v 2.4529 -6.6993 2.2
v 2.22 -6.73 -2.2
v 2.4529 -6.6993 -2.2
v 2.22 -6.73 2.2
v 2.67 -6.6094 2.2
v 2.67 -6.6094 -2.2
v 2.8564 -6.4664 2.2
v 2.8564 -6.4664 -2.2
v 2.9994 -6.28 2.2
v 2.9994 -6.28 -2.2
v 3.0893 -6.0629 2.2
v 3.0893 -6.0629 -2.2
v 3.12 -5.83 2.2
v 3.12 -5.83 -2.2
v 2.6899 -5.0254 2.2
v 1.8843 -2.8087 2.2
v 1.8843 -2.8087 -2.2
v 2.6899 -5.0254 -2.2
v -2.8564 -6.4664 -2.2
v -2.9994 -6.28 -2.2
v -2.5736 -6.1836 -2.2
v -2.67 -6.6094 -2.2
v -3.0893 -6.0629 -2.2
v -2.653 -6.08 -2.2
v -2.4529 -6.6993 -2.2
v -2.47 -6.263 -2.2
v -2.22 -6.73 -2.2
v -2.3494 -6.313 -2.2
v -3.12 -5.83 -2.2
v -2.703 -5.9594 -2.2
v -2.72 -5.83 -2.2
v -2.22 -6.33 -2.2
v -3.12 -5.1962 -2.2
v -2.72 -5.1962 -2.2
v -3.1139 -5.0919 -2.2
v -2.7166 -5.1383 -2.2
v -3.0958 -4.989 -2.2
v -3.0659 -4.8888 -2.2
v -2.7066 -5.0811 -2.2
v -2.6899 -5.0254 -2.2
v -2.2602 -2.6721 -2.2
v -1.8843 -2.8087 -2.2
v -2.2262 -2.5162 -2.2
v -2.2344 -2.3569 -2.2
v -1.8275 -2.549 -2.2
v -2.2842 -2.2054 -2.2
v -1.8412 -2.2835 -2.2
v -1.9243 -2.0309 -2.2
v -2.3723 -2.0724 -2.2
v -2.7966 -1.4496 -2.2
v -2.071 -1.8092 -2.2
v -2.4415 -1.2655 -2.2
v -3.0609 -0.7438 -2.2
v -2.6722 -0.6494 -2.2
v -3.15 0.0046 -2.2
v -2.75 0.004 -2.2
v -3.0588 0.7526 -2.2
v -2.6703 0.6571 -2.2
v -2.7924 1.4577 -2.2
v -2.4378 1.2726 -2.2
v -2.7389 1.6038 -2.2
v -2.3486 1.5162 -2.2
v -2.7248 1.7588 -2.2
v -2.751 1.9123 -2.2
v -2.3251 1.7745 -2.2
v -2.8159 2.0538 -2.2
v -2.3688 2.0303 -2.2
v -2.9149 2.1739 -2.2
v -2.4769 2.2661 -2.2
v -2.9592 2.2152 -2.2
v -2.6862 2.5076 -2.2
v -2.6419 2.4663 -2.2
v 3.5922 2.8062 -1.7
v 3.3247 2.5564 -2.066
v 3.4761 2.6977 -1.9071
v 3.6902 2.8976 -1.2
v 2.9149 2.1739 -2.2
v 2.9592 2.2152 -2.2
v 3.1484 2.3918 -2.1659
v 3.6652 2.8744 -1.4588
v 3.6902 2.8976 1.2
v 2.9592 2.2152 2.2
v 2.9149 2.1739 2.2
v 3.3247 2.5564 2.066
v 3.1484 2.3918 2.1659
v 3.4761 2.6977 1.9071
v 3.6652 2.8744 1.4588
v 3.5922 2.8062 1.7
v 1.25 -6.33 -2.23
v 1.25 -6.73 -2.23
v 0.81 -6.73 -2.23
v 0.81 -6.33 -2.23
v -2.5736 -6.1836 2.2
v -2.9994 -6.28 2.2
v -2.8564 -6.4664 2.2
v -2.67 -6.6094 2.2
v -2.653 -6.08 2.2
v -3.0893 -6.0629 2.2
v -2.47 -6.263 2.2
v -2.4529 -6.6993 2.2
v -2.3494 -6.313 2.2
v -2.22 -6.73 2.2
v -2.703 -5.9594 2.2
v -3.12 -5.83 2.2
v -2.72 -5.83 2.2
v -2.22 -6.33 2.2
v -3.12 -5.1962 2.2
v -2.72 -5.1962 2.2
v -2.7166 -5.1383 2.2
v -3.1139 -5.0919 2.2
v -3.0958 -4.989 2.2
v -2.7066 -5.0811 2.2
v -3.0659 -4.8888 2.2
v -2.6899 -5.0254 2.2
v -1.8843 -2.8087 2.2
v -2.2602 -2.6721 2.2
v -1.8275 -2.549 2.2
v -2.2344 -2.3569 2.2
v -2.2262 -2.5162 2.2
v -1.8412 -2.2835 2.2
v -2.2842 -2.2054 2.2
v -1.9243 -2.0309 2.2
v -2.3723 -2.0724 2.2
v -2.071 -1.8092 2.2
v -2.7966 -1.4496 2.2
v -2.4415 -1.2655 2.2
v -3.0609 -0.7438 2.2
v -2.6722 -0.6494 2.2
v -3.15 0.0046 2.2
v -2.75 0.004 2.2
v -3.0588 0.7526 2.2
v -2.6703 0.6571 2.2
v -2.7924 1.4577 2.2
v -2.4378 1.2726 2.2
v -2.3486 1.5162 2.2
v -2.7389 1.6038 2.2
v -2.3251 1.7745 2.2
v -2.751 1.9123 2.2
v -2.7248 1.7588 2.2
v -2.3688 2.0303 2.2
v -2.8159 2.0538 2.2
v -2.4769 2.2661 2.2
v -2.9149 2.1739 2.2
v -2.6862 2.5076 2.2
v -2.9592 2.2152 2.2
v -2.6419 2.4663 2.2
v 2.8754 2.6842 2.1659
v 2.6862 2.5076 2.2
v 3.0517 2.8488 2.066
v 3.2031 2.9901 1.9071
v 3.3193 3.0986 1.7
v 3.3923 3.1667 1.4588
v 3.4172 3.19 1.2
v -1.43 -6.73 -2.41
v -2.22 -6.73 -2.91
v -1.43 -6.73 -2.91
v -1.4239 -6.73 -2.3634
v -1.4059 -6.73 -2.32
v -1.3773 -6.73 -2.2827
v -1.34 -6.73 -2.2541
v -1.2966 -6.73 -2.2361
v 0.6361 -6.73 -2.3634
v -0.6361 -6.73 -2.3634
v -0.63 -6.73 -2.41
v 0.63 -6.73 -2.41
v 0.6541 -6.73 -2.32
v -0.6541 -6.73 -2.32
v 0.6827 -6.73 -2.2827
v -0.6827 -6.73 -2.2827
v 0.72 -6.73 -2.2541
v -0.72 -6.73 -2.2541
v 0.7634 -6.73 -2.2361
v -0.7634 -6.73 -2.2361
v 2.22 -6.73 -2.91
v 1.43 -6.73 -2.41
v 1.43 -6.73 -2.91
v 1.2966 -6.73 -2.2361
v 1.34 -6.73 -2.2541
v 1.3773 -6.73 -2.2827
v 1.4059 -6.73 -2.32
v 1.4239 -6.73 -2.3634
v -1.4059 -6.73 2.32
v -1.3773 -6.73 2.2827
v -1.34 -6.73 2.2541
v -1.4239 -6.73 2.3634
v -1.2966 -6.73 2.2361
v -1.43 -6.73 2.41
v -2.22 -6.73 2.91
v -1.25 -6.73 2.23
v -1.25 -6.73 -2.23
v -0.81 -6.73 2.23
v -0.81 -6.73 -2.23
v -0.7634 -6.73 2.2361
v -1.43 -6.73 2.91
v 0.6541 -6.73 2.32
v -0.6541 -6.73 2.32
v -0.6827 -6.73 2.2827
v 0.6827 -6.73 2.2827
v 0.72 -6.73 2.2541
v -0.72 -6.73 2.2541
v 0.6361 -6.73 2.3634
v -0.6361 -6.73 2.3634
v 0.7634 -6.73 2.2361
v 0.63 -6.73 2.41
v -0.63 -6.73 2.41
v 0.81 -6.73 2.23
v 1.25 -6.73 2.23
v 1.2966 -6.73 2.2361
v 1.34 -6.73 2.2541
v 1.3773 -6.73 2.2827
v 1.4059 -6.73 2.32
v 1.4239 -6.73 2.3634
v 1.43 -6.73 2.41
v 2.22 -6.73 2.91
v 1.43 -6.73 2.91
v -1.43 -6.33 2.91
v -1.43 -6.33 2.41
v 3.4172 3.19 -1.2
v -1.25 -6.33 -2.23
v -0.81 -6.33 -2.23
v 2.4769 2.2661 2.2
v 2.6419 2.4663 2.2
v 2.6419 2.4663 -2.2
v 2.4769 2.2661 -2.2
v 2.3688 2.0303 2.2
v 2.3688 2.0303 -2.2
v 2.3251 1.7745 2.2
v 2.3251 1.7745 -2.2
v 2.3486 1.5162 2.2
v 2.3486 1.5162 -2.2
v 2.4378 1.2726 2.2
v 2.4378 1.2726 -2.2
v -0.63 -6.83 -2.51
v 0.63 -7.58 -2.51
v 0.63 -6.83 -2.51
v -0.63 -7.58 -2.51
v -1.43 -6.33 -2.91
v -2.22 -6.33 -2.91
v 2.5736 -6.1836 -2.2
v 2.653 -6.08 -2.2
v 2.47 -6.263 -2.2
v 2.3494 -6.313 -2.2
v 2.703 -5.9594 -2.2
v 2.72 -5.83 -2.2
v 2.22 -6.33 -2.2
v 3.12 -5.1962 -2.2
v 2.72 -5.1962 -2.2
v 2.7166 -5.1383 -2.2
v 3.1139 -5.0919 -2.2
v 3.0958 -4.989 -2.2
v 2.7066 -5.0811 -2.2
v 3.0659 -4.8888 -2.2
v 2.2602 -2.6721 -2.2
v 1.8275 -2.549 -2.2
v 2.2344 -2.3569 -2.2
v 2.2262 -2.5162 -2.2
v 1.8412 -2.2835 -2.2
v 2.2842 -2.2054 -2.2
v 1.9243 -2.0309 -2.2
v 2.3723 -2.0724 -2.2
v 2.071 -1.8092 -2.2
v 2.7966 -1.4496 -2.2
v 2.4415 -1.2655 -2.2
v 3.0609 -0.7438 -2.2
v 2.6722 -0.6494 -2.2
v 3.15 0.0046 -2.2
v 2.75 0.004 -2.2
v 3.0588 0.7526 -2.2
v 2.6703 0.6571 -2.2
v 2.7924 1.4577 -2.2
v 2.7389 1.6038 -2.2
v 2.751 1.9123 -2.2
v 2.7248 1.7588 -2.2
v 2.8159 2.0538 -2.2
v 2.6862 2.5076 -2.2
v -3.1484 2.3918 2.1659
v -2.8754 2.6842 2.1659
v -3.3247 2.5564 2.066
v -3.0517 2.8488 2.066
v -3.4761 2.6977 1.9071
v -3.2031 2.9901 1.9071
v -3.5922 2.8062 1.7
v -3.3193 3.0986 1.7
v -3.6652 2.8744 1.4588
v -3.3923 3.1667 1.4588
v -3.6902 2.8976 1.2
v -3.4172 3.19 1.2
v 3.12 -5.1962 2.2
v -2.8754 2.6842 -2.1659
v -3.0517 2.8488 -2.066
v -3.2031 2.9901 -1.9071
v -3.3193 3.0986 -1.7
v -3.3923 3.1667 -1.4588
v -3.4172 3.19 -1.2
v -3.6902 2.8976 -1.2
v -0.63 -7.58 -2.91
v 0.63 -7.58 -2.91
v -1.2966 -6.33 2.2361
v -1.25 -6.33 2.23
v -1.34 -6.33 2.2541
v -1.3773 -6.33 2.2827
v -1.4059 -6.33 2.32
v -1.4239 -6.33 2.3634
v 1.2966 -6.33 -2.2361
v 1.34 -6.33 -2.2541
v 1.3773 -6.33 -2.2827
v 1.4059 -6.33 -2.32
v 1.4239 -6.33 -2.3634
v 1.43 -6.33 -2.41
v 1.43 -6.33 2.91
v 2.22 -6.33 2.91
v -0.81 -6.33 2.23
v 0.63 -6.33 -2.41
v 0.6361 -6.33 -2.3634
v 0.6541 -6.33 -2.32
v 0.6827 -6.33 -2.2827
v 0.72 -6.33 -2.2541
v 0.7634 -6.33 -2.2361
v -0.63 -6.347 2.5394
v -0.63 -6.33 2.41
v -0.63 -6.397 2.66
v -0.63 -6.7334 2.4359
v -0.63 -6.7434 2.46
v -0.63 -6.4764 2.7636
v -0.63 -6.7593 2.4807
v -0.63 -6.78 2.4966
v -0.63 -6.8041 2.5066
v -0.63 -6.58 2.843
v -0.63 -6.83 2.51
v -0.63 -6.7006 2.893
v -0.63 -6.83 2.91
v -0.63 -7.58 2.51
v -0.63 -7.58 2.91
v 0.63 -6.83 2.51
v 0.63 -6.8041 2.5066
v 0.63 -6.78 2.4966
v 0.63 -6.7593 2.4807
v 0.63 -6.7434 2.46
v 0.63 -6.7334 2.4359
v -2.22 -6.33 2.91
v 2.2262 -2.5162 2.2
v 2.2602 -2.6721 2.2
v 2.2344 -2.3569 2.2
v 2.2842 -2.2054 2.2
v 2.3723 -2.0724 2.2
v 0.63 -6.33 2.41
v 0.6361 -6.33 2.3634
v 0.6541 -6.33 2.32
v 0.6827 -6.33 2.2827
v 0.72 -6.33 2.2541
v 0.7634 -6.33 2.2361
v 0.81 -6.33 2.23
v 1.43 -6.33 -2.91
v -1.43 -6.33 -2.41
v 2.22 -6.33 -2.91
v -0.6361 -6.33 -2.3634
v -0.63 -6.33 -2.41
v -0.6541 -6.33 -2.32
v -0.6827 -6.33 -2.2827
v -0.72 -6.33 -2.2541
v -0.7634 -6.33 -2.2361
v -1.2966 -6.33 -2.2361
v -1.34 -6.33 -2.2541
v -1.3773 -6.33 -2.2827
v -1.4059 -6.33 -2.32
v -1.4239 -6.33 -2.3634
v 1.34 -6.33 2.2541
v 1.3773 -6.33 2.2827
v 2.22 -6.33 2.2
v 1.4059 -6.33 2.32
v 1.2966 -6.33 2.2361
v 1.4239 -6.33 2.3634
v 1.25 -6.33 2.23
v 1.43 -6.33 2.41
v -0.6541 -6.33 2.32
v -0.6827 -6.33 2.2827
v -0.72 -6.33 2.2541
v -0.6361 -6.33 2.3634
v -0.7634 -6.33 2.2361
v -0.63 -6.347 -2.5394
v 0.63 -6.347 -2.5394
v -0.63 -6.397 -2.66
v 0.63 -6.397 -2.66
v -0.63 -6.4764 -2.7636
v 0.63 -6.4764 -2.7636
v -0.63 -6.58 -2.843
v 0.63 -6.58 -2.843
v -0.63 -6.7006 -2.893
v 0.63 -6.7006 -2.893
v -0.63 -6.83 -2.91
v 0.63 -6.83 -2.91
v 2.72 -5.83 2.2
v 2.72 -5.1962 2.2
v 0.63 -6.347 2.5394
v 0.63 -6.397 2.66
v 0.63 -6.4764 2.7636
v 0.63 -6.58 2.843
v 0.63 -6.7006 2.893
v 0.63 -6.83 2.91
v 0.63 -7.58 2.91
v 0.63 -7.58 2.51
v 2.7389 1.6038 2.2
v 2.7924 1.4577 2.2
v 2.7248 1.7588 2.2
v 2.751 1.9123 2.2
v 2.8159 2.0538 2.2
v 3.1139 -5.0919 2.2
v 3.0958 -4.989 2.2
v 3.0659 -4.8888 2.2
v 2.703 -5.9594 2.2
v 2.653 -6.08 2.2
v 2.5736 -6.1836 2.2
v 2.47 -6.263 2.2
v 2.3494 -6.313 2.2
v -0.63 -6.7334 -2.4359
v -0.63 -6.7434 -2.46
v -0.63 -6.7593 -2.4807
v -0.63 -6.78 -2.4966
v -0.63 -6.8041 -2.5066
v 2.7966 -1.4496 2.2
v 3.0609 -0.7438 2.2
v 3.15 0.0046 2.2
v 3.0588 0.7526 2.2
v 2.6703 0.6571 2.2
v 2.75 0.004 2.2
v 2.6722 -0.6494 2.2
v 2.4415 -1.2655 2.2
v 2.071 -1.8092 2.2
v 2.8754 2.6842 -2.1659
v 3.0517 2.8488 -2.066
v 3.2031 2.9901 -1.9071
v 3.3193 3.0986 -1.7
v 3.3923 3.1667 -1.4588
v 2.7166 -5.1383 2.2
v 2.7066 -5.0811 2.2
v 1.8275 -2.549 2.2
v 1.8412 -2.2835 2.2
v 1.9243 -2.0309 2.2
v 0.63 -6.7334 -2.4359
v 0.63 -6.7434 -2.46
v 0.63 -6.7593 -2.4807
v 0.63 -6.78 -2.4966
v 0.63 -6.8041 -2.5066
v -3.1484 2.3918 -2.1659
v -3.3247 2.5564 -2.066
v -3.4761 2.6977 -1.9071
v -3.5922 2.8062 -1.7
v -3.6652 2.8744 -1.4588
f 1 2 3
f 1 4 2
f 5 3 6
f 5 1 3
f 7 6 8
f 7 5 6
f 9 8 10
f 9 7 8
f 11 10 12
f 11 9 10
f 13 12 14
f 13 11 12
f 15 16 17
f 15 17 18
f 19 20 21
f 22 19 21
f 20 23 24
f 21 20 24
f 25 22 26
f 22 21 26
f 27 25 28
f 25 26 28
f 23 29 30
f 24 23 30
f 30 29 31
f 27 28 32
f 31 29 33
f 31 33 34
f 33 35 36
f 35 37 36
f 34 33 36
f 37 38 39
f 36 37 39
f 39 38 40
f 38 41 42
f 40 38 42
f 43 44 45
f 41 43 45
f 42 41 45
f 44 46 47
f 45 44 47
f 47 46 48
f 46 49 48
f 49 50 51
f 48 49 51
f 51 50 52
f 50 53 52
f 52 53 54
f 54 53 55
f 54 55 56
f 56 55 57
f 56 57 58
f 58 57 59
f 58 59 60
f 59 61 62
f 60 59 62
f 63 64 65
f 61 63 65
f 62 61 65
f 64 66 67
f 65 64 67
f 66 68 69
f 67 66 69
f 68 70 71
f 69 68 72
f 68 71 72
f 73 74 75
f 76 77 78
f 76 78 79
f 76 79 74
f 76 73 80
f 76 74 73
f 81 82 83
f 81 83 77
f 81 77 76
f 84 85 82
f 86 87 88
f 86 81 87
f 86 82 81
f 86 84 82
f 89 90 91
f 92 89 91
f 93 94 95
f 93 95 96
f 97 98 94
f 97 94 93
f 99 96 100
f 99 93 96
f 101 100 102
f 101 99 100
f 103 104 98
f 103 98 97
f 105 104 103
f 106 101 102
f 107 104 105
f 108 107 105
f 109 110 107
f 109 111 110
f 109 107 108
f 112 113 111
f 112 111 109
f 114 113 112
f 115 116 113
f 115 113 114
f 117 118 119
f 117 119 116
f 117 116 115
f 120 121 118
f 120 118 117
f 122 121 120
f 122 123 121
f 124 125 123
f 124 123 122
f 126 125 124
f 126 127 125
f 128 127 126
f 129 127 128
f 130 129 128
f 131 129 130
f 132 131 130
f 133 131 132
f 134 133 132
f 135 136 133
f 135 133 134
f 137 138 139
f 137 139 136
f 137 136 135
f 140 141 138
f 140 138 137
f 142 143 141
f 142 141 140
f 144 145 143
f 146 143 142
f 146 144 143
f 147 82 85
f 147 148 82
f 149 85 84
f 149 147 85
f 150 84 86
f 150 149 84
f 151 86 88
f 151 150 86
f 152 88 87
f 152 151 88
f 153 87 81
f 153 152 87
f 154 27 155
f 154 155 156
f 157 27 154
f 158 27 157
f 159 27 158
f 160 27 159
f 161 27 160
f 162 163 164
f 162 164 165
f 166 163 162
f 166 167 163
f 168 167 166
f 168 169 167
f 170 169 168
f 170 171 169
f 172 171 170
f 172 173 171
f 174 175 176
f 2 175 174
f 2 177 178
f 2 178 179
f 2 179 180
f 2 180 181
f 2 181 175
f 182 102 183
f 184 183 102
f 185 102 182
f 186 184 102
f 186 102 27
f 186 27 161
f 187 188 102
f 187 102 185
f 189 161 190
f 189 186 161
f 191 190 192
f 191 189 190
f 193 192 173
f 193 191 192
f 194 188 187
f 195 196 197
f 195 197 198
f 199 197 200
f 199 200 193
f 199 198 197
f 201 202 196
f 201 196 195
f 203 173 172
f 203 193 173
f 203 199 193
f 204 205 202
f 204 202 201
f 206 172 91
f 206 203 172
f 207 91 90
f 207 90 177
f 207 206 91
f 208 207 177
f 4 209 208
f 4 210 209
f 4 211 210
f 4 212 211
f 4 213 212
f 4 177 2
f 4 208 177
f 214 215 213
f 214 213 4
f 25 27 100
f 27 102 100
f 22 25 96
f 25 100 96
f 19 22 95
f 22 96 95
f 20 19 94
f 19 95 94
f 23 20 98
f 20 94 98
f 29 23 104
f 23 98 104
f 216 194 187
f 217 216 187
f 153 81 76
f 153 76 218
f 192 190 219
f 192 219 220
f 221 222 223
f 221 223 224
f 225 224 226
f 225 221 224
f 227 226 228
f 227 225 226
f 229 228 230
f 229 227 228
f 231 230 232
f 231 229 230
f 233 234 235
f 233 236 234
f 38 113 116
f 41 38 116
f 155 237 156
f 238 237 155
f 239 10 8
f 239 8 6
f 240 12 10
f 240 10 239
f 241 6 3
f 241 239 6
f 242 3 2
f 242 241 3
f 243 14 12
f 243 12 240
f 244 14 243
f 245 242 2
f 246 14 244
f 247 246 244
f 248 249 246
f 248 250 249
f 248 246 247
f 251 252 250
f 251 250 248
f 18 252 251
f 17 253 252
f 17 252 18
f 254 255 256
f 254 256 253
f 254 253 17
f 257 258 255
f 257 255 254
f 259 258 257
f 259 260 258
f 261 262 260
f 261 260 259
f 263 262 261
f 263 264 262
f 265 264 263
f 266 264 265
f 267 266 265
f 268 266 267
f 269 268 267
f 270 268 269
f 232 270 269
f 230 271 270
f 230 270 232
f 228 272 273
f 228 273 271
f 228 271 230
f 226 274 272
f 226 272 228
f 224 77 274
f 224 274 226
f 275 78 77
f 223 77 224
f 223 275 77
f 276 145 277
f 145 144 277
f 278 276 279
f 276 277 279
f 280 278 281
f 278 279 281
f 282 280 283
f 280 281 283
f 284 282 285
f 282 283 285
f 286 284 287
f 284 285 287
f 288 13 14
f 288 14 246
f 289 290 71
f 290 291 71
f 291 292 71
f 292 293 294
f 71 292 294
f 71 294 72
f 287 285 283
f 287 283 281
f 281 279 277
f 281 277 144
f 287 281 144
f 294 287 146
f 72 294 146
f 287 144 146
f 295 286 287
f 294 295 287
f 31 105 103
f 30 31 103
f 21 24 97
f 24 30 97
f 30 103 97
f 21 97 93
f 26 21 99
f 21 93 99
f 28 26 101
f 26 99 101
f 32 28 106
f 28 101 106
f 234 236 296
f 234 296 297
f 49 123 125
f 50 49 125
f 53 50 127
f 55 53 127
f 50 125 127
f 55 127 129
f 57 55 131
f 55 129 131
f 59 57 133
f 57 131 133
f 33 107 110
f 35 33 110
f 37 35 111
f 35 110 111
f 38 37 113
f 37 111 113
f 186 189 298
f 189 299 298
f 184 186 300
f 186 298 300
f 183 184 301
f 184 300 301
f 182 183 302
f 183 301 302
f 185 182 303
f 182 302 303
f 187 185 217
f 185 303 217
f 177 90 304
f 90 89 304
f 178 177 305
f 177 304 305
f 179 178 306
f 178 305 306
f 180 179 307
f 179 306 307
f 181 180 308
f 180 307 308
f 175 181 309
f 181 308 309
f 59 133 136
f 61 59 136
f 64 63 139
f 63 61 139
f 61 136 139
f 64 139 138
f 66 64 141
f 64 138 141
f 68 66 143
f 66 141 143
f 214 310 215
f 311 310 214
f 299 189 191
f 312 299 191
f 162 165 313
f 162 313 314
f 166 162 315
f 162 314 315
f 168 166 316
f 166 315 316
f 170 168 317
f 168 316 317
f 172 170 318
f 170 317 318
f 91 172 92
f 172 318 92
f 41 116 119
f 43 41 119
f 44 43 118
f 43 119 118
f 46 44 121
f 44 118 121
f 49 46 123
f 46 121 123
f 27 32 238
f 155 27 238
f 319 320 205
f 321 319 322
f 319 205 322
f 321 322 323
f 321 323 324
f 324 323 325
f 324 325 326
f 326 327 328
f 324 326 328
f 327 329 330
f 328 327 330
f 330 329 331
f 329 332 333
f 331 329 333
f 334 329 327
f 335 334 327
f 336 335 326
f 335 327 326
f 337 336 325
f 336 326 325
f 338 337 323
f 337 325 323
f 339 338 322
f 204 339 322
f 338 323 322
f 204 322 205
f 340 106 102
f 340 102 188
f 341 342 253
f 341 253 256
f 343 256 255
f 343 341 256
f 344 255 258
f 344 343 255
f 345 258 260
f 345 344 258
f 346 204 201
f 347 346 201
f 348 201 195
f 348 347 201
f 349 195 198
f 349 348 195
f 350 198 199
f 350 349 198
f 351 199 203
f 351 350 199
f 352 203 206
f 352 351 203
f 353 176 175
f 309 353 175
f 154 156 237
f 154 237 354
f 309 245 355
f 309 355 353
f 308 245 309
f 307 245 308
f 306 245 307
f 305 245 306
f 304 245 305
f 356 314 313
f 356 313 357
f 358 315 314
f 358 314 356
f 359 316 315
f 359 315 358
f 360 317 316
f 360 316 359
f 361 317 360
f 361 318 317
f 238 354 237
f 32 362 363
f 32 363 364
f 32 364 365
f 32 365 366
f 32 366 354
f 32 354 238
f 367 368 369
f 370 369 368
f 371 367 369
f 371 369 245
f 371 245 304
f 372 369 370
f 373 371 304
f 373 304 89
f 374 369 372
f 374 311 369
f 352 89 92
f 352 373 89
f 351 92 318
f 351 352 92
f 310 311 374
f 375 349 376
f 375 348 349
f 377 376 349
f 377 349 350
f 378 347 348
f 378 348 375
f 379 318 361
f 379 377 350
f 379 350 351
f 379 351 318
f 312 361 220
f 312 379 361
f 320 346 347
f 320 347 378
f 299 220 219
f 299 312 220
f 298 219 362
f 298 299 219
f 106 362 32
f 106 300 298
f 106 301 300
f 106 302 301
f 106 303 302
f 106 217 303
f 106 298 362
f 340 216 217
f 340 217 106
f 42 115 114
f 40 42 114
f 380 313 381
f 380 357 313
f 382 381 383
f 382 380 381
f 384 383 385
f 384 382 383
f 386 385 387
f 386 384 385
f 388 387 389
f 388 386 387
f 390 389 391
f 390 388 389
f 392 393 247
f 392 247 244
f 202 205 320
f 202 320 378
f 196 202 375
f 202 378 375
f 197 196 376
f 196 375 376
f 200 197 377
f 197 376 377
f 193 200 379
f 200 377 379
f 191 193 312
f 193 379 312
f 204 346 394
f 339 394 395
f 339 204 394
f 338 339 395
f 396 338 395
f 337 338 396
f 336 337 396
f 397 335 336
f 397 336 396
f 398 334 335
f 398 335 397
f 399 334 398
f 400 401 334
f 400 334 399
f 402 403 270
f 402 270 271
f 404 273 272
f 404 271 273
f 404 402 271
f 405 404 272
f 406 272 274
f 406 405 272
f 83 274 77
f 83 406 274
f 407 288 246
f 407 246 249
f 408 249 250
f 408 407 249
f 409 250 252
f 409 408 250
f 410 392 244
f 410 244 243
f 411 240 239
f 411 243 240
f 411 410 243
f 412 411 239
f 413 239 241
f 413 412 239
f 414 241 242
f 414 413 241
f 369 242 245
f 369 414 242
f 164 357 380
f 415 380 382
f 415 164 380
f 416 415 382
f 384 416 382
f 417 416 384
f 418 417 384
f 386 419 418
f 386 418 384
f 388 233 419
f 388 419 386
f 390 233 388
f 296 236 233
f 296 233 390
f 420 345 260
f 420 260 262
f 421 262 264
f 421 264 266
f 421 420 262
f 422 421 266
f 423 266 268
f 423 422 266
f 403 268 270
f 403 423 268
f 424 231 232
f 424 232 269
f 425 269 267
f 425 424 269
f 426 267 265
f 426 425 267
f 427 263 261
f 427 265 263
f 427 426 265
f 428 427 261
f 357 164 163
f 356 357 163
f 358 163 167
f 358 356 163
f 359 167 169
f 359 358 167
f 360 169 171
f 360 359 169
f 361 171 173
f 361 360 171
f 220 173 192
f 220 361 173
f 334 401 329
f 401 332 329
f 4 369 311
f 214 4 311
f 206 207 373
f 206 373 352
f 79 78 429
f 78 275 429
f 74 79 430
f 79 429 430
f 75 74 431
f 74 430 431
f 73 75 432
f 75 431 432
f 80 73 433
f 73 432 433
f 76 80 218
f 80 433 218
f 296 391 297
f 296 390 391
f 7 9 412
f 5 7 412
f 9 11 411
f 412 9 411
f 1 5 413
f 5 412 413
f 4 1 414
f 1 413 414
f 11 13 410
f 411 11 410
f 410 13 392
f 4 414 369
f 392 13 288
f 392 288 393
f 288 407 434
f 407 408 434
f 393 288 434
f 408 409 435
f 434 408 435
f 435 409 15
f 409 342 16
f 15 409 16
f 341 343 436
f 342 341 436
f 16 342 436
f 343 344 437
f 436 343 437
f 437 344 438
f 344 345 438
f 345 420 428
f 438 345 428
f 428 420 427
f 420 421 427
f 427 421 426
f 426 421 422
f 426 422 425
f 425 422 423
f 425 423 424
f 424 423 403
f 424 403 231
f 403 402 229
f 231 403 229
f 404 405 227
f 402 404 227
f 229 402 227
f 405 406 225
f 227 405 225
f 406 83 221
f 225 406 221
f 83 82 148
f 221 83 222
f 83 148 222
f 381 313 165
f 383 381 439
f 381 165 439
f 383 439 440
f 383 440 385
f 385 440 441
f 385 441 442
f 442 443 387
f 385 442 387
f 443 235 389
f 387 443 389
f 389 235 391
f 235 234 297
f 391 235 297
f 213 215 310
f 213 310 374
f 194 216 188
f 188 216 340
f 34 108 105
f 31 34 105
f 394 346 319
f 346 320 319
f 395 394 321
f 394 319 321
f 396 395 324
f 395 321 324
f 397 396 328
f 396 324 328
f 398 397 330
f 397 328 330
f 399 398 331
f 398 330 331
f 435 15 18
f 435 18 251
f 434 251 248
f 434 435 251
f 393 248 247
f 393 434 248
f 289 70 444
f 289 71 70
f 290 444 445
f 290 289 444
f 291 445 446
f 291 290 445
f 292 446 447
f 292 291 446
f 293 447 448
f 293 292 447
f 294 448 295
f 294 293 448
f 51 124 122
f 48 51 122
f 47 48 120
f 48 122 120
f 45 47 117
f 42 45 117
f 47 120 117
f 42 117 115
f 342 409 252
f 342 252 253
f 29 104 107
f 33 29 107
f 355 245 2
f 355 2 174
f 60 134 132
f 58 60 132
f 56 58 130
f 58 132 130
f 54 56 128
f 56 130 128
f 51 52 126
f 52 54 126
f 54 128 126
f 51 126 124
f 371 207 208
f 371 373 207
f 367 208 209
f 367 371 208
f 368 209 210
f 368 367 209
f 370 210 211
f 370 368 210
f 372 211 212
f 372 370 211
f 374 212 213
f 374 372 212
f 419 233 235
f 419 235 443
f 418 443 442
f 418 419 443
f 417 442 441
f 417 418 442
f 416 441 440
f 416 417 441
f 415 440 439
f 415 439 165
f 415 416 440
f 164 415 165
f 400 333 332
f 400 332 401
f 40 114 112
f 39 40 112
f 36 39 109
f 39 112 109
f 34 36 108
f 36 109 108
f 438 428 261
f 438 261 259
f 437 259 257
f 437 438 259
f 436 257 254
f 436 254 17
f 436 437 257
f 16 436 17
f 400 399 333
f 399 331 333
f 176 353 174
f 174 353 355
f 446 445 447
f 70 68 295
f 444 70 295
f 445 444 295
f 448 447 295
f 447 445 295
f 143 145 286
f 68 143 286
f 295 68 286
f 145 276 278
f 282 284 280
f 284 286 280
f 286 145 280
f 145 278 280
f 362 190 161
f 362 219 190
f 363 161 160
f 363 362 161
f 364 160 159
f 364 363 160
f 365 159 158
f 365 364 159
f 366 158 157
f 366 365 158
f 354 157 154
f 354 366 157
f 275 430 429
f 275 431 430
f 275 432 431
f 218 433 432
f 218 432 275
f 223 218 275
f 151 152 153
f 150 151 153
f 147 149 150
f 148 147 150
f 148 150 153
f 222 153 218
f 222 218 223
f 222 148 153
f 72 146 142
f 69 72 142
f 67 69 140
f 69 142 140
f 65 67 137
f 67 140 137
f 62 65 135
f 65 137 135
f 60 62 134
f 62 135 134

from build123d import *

# Parameters (mm, degrees)
SM_BASE_FLANGE_1_DEPTH            = 2.91
CUT_EXTRUDE_START                 = -9.92
CUT_EXTRUDE_2_OUTLINE_W           = 5
CUT_EXTRUDE_2_OUTLINE_H           = 0.71
CUT_EXTRUDE_2_DEPTH               = 9.52
CUT_EXTRUDE_START_2               = -0.4
CUT_EXTRUDE_2_2_OUTLINE_W         = 0.9
CUT_EXTRUDE_2_2_OUTLINE_H         = 0.71
CUT_EXTRUDE_2_2_DEPTH             = 0.4
SM_EDGE_FLANGE_2_STRIP_W          = 1.8
SM_EDGE_FLANGE_2_STRIP_H          = 0.4
SM_EDGE_FLANGE_2_STRIP_CUT_DEPTH  = 0.63
SM_EDGE_FLANGE_2_RELIEF_W         = 1.98
SM_EDGE_FLANGE_2_RELIEF_H         = 0.8
SM_EDGE_FLANGE_2_RELIEF_CUT_DEPTH = 0.4
SM_EDGE_FLANGE_2_DEPTH            = 0.63
FILLET_3_R                        = 0.18
CUT_EXTRUDE_4_DEPTH               = 12.348755283
FILLET_4_R                        = 1
SKETCH_33_W                       = 2.00295296
SKETCH_33_H                       = 3.384867517
CUT_EXTRUDE_5_DEPTH               = 13.417670735


# Read off the part's stored shape, not the designer's step: 切除-拉伸2
# Sheet-metal steps are written as plain solids
with BuildPart() as part:
    # Sketch 1 → 基体-法兰1 (new body)
    with BuildSketch(Plane.XY):
        with BuildLine():
            Line((-3.4172, 3.19), (-2.64194931, 2.466293544))
            ThreePointArc((-2.64194931, 2.466293544), (-2.338641394, 1.90383514), (-2.437847629, 1.272556064))
            ThreePointArc((-2.437847629, 1.272556064), (-2.730725187, -0.325023008), (-2.071040526, -1.809223905))
            ThreePointArc((-2.071040526, -1.809223905), (-1.841158131, -2.283453933), (-1.884290869, -2.808696355))
            Line((-1.884290869, -2.808696355), (-2.689927651, -5.025447504))
            ThreePointArc((-2.689927651, -5.025447504), (-2.712424525, -5.109527023), (-2.72, -5.196233927))
            Line((-2.72, -5.196233927), (-2.72, -5.83))
            ThreePointArc((-2.72, -5.83), (-2.573553391, -6.183553391), (-2.22, -6.33))
            Line((-2.22, -6.33), (0, -6.33))
            Line((0, -6.33), (0, -6.73))
            Line((0, -6.73), (-2.22, -6.73))
            ThreePointArc((-2.22, -6.73), (-2.856396103, -6.466396103), (-3.12, -5.83))
            Line((-3.12, -5.83), (-3.12, -5.196233927))
            ThreePointArc((-3.12, -5.196233927), (-3.106364145, -5.0401615), (-3.065869772, -4.888818365))
            Line((-3.065869772, -4.888818365), (-2.26023299, -2.672067216))
            ThreePointArc((-2.26023299, -2.672067216), (-2.234353348, -2.356921763), (-2.372282784, -2.072383746))
            ThreePointArc((-2.372282784, -2.072383746), (-3.127921577, -0.372299082), (-2.792443648, 1.457655128))
            ThreePointArc((-2.792443648, 1.457655128), (-2.732919907, 1.836422573), (-2.914904656, 2.173897616))
            Line((-2.914904656, 2.173897616), (-3.690155347, 2.897604072))
            Line((-3.690155347, 2.897604072), (-3.4172, 3.19))
        make_face()
    extrude(amount=SM_BASE_FLANGE_1_DEPTH)

    # 切除-拉伸2 outline → 切除-拉伸2 (cut)
    with BuildSketch(Plane.XZ.offset(6.73).offset(CUT_EXTRUDE_START)):
        with Locations((-2.5, 2.555)):
            Rectangle(CUT_EXTRUDE_2_OUTLINE_W, CUT_EXTRUDE_2_OUTLINE_H)
    extrude(amount=CUT_EXTRUDE_2_DEPTH, mode=Mode.SUBTRACT)

    # Cut-Extrude 2 2 outline → Cut-Extrude 2 2 (cut)
    with BuildSketch(Plane.XZ.offset(6.73).offset(CUT_EXTRUDE_START_2)):
        with Locations((-2.67, 2.555)):
            Rectangle(CUT_EXTRUDE_2_2_OUTLINE_W, CUT_EXTRUDE_2_2_OUTLINE_H)
    extrude(amount=CUT_EXTRUDE_2_2_DEPTH, mode=Mode.SUBTRACT)

    # 边线-法兰2 strip (across the edge) → 边线-法兰2 strip cut (cut)
    with BuildSketch(Plane(origin=(0, -6.73, 2.91), x_dir=(0, 0, -1), z_dir=(-1, 0, 0))):
        with Locations((-0.4, -0.2)):
            Rectangle(SM_EDGE_FLANGE_2_STRIP_W, SM_EDGE_FLANGE_2_STRIP_H)
    extrude(amount=SM_EDGE_FLANGE_2_STRIP_CUT_DEPTH, mode=Mode.SUBTRACT)

    # 边线-法兰2 relief (on the sheet) → 边线-法兰2 relief cut (cut)
    with BuildSketch(Plane(origin=(0, -6.73, 2.41), x_dir=(0, 0, -1), z_dir=(0, -1, 0))):
        with Locations((-0.81, -1.03)):
            Rectangle(SM_EDGE_FLANGE_2_RELIEF_W, SM_EDGE_FLANGE_2_RELIEF_H)
    extrude(amount=-SM_EDGE_FLANGE_2_RELIEF_CUT_DEPTH, mode=Mode.SUBTRACT)

    # 边线-法兰2 section (across the edge) → 边线-法兰2 (add)
    with BuildSketch(Plane(origin=(0, -6.73, 2.91), x_dir=(0, 0, -1), z_dir=(-1, 0, 0))):
        with BuildLine():
            Line((0, 0.1), (0, 3.6))
            Line((0, 3.6), (0.4, 3.6))
            Line((0.4, 3.6), (0.4, 0.1))
            ThreePointArc((0.4, 0.1), (0.429289322, 0.029289322), (0.5, 0))
            Line((0.5, 0), (0.5, -0.4))
            ThreePointArc((0.5, -0.4), (0.146446609, -0.253553391), (0, 0.1))
        make_face()
    extrude(amount=SM_EDGE_FLANGE_2_DEPTH)

    # 圆角3
    fillet_3_edges = [part.edges().sort_by_distance(p)[0] for p in [
        (-1.43, -6.53, 2.23),
        (-0.63, -6.53, 2.23),
    ]]
    fillet(fillet_3_edges, radius=FILLET_3_R)

    # 草图29 → 切除-拉伸4 (cut, through all)
    with BuildSketch(Plane.XY.offset(2.91)):
        with BuildLine():
            Line((-0.63, -8.93), (-1.33273135, -8.93))
            Line((-1.33273135, -8.93), (-1.33273135, -10.562100009))
            Line((-1.33273135, -10.562100009), (0, -10.562100009))
            Line((0, -10.562100009), (0, -10.33))
            ThreePointArc((0, -10.33), (-0.465244282, -9.697609927), (-0.63, -8.93))
        make_face()
    extrude(amount=-CUT_EXTRUDE_4_DEPTH, mode=Mode.SUBTRACT)

    # 圆角4
    fillet_4_edges = [part.edges().sort_by_distance(p)[0] for p in [
        (-3.553677673, 3.043802036, 2.2),
    ]]
    fillet(fillet_4_edges, radius=FILLET_4_R)

    # 镜向8: part across plane


with BuildPart() as part_1:
    add(part.part)
    add(part.part.mirror(Plane(origin=(0, -6.33, 2.91), x_dir=(0, 0, 1), z_dir=(1, 0, 0))))

    # 镜向9: part across plane


with BuildPart() as part_2:
    add(part_1.part)
    add(part_1.part.mirror(Plane(origin=(-2.26023299, -2.672067216, 0), x_dir=(1, 0, 0), z_dir=(0, 0, -1))))

    # 草图33 → 切除-拉伸5 (cut, through all)
    with BuildSketch(Plane.XY.offset(2.91)):
        with Locations((0, -9.272433759)):
            Rectangle(SKETCH_33_W, SKETCH_33_H)
    extrude(amount=-CUT_EXTRUDE_5_DEPTH, mode=Mode.SUBTRACT)


solid = part_2.part
